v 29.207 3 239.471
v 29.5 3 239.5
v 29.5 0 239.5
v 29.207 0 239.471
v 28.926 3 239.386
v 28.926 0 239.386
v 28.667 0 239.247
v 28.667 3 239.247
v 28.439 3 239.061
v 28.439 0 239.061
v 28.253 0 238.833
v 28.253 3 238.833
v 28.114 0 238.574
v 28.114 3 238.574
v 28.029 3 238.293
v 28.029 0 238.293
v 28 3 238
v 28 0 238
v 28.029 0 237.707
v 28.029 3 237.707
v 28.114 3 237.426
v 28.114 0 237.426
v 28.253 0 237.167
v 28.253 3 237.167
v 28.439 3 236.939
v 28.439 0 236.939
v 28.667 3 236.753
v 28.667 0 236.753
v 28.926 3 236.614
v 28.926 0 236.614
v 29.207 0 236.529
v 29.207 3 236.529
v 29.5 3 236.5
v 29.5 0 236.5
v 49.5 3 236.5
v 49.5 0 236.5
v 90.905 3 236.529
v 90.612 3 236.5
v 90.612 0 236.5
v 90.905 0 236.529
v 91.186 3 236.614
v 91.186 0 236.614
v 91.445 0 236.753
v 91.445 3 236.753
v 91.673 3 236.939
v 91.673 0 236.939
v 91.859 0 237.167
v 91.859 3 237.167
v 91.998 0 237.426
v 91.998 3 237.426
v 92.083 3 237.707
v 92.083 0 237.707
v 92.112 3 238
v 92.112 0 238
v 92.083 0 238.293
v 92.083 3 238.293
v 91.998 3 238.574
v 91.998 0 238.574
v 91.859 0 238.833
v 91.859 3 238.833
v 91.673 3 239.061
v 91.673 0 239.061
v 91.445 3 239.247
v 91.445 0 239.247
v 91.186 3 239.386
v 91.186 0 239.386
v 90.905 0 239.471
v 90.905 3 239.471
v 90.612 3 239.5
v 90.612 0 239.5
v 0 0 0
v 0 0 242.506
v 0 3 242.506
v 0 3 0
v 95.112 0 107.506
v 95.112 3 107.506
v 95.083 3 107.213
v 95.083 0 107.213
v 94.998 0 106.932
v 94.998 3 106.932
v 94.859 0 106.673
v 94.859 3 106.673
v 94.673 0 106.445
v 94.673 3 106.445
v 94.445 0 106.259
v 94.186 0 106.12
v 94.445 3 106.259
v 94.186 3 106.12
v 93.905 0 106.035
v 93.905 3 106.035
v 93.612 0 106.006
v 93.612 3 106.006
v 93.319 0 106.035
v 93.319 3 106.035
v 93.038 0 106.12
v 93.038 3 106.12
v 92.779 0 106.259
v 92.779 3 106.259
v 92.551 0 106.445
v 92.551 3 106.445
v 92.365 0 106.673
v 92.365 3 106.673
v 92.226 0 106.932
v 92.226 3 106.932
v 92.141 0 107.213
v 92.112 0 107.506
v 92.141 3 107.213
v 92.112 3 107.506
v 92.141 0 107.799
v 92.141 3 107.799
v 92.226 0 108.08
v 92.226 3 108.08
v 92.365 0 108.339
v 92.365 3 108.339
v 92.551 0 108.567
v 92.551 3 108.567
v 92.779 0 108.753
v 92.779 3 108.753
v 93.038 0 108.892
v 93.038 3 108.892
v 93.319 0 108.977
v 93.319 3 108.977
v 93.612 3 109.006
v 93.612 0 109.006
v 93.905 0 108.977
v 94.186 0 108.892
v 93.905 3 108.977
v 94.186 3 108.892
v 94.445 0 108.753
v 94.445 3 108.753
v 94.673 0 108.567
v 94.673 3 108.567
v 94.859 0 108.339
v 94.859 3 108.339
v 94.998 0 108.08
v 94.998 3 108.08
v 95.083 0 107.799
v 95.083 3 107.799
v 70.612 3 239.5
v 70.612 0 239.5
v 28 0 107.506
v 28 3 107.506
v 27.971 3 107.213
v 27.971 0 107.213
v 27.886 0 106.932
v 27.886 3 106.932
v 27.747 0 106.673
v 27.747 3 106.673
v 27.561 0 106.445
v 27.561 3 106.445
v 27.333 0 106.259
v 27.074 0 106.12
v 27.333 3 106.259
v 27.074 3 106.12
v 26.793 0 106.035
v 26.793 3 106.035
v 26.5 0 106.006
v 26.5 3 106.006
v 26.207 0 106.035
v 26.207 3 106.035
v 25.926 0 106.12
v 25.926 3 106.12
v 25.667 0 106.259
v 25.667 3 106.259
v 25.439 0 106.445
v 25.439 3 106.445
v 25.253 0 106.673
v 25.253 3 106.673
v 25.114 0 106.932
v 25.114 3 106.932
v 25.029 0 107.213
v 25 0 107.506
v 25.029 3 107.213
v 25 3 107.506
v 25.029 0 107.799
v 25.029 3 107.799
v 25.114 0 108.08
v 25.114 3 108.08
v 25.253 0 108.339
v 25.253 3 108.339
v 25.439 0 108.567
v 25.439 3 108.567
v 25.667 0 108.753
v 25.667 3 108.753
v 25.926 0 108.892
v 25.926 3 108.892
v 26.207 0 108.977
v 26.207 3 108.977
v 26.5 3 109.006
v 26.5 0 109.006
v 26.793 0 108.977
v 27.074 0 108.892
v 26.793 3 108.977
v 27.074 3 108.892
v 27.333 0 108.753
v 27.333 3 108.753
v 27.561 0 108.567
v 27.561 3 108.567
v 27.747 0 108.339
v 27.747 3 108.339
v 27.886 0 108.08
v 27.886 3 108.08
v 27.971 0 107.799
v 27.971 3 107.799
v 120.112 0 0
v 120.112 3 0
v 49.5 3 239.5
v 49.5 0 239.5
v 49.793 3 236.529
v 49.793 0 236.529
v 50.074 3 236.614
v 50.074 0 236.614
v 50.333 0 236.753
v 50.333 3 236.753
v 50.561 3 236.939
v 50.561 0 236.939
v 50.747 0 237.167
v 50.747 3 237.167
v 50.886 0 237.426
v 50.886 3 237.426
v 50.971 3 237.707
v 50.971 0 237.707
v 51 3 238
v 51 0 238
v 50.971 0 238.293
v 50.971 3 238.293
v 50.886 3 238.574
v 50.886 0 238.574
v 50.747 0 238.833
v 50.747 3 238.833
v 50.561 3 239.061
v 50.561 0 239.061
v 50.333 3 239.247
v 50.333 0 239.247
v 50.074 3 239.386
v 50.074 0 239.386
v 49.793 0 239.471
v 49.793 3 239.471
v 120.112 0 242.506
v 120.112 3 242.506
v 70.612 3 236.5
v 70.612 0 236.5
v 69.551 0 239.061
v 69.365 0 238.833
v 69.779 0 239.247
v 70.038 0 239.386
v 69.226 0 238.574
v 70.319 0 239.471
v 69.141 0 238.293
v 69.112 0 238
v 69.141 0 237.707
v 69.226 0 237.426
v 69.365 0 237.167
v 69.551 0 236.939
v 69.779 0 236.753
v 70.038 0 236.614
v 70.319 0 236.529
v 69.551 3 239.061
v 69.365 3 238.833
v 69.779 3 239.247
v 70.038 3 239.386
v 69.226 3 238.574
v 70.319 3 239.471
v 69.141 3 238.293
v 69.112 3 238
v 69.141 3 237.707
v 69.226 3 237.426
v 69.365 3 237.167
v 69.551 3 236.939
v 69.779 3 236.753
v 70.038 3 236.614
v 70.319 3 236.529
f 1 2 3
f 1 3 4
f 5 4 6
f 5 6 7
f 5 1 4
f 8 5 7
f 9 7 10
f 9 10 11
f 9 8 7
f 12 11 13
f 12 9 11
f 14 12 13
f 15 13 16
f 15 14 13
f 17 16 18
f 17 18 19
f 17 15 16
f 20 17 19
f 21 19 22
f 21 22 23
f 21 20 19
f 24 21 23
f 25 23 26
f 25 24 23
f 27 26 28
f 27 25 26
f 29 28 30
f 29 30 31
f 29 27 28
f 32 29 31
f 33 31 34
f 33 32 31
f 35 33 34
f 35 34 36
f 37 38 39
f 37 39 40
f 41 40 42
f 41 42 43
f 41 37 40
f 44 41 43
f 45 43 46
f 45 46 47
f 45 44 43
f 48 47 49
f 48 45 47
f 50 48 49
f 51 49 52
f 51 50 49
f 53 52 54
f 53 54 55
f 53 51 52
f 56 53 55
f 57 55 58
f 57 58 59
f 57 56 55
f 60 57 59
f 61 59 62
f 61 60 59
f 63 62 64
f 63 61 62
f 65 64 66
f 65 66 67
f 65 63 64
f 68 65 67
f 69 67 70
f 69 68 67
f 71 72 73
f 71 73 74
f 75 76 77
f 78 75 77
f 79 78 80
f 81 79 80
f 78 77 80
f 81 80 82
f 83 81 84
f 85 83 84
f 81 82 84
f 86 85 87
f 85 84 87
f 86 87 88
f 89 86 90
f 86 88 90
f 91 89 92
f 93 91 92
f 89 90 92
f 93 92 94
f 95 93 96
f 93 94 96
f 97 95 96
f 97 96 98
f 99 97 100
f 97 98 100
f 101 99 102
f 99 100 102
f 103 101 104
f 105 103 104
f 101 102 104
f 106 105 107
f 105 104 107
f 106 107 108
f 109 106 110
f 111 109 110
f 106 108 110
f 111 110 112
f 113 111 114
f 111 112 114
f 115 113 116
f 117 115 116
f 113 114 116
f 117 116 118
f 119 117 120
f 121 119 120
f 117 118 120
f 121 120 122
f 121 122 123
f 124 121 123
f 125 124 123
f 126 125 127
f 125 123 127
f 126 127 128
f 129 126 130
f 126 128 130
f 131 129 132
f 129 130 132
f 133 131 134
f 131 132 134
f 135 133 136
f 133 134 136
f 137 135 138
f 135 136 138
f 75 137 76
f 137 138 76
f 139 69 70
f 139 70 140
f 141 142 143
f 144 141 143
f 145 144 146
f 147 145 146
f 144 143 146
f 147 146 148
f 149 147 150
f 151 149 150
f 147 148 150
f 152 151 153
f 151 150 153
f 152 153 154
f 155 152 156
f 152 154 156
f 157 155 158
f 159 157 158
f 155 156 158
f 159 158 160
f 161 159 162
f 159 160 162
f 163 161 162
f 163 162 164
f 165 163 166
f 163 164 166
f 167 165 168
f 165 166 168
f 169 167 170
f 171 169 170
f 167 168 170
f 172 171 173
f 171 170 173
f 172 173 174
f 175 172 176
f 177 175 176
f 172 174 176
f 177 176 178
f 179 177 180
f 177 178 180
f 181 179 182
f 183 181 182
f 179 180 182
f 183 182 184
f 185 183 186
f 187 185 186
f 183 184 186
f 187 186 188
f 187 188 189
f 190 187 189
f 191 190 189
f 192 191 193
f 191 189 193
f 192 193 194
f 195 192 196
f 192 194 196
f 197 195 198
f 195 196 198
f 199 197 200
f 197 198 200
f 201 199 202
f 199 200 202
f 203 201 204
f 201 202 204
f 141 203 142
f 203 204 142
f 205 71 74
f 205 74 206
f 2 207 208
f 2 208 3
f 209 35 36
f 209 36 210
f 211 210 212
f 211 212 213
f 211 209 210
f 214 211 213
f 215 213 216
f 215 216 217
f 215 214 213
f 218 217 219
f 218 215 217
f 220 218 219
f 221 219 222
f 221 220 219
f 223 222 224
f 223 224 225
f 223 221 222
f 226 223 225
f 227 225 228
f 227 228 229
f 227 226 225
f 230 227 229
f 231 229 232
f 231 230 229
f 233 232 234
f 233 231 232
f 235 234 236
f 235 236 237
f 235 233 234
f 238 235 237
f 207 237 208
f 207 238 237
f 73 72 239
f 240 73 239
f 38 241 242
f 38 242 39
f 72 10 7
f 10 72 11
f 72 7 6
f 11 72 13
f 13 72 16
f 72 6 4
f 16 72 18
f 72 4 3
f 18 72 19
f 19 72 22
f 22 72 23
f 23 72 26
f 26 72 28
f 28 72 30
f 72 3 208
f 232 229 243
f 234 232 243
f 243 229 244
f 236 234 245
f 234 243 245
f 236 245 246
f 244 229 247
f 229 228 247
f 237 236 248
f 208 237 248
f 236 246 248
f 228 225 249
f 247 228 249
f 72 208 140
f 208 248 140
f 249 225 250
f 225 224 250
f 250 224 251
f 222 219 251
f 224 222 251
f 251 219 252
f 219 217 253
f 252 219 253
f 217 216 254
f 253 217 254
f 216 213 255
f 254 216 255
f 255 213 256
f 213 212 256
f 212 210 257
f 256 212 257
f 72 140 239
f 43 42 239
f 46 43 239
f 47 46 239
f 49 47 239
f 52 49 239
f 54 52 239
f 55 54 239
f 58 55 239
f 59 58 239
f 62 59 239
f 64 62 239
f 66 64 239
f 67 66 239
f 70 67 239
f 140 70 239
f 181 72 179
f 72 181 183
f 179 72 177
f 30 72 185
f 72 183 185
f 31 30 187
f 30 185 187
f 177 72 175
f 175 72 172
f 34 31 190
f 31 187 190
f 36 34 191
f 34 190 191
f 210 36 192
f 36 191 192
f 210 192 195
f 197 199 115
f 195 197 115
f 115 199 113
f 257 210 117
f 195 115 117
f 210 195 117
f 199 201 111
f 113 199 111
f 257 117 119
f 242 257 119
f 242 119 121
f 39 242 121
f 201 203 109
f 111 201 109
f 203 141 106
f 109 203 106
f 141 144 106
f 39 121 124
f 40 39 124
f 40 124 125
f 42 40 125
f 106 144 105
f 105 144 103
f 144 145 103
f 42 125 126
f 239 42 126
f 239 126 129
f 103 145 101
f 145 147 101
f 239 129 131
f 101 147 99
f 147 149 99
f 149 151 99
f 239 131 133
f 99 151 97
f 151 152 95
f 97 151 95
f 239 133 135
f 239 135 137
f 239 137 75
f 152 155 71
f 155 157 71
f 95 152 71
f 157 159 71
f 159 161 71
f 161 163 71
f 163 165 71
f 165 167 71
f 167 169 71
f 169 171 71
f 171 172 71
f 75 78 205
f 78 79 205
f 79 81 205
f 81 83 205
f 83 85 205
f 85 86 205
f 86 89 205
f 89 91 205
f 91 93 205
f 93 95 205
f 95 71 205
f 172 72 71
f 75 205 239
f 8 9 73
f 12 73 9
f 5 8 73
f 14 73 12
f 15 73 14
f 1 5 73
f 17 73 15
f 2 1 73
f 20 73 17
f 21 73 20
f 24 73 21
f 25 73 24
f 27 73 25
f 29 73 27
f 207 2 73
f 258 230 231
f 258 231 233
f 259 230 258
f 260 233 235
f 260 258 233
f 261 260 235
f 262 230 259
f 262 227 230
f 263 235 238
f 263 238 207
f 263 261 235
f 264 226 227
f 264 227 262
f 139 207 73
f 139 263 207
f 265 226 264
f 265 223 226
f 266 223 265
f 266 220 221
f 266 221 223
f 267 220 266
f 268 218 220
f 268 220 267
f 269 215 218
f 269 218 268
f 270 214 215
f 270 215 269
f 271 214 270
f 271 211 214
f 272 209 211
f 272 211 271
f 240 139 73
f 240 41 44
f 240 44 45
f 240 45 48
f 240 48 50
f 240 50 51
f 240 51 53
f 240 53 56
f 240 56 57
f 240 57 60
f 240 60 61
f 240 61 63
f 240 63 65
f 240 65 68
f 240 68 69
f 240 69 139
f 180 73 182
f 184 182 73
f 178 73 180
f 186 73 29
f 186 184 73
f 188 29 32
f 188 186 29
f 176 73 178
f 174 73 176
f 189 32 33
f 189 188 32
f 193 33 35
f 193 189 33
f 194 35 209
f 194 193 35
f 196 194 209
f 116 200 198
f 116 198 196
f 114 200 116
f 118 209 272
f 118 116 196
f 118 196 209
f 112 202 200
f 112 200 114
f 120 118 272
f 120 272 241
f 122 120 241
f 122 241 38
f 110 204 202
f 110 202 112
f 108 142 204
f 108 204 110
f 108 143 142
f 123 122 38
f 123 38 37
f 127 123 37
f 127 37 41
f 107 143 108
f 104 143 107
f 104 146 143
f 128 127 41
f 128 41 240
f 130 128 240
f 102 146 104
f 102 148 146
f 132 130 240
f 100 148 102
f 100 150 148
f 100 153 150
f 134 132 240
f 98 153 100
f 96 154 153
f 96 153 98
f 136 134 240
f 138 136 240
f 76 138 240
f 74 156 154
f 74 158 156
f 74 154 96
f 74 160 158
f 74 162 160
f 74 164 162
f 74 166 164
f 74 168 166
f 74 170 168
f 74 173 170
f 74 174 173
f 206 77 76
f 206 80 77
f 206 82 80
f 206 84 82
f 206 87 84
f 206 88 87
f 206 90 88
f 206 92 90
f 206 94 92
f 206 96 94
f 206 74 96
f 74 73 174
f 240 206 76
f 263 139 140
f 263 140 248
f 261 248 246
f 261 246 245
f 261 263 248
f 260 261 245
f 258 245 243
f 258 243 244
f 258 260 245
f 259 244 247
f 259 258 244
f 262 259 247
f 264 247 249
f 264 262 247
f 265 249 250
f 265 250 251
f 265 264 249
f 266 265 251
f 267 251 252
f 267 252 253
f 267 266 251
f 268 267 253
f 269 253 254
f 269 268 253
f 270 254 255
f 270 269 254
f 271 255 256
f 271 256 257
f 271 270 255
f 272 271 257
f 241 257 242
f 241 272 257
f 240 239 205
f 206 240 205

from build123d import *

# Parameters (mm, degrees)
SKETCH_1_W          = 120.112060779
SKETCH_1_H          = 242.505963566
EXTRUDE_1_DEPTH     = 3
SKETCH_3_R          = 1.5
CUT_EXTRUDE_5_DEPTH = 3


with BuildPart() as part:
    # 草图1 → 凸台-拉伸1 (new body)
    with BuildSketch(Plane(origin=(0, 0, 0), x_dir=(1, 0, 0), z_dir=(0, 1, 0))):
        with Locations((60.05603039, -121.252981783)):
            Rectangle(SKETCH_1_W, SKETCH_1_H)
    extrude(amount=EXTRUDE_1_DEPTH)

    # 草图3 → 切除-拉伸5 (cut)
    with BuildSketch(Plane(origin=(0, 3, 0), x_dir=(1, 0, 0), z_dir=(0, 1, 0))):
        with Locations((26.5, -107.505963566)):
            Circle(SKETCH_3_R)
        with Locations((93.612060779, -107.505963566)):
            Circle(SKETCH_3_R)
        with BuildLine():
            Line((29.5, -236.5), (49.5, -236.5))
            ThreePointArc((49.5, -236.5), (51, -238), (49.5, -239.5))
            Line((49.5, -239.5), (29.5, -239.5))
            ThreePointArc((29.5, -239.5), (28, -238), (29.5, -236.5))
        make_face()
        with BuildLine():
            Line((70.612060779, -236.5), (90.612060779, -236.5))
            ThreePointArc((90.612060779, -236.5), (92.112060779, -238), (90.612060779, -239.5))
            Line((90.612060779, -239.5), (70.612060779, -239.5))
            ThreePointArc((70.612060779, -239.5), (69.112060779, -238), (70.612060779, -236.5))
        make_face()
    extrude(amount=-CUT_EXTRUDE_5_DEPTH, mode=Mode.SUBTRACT)


solid = part.part
